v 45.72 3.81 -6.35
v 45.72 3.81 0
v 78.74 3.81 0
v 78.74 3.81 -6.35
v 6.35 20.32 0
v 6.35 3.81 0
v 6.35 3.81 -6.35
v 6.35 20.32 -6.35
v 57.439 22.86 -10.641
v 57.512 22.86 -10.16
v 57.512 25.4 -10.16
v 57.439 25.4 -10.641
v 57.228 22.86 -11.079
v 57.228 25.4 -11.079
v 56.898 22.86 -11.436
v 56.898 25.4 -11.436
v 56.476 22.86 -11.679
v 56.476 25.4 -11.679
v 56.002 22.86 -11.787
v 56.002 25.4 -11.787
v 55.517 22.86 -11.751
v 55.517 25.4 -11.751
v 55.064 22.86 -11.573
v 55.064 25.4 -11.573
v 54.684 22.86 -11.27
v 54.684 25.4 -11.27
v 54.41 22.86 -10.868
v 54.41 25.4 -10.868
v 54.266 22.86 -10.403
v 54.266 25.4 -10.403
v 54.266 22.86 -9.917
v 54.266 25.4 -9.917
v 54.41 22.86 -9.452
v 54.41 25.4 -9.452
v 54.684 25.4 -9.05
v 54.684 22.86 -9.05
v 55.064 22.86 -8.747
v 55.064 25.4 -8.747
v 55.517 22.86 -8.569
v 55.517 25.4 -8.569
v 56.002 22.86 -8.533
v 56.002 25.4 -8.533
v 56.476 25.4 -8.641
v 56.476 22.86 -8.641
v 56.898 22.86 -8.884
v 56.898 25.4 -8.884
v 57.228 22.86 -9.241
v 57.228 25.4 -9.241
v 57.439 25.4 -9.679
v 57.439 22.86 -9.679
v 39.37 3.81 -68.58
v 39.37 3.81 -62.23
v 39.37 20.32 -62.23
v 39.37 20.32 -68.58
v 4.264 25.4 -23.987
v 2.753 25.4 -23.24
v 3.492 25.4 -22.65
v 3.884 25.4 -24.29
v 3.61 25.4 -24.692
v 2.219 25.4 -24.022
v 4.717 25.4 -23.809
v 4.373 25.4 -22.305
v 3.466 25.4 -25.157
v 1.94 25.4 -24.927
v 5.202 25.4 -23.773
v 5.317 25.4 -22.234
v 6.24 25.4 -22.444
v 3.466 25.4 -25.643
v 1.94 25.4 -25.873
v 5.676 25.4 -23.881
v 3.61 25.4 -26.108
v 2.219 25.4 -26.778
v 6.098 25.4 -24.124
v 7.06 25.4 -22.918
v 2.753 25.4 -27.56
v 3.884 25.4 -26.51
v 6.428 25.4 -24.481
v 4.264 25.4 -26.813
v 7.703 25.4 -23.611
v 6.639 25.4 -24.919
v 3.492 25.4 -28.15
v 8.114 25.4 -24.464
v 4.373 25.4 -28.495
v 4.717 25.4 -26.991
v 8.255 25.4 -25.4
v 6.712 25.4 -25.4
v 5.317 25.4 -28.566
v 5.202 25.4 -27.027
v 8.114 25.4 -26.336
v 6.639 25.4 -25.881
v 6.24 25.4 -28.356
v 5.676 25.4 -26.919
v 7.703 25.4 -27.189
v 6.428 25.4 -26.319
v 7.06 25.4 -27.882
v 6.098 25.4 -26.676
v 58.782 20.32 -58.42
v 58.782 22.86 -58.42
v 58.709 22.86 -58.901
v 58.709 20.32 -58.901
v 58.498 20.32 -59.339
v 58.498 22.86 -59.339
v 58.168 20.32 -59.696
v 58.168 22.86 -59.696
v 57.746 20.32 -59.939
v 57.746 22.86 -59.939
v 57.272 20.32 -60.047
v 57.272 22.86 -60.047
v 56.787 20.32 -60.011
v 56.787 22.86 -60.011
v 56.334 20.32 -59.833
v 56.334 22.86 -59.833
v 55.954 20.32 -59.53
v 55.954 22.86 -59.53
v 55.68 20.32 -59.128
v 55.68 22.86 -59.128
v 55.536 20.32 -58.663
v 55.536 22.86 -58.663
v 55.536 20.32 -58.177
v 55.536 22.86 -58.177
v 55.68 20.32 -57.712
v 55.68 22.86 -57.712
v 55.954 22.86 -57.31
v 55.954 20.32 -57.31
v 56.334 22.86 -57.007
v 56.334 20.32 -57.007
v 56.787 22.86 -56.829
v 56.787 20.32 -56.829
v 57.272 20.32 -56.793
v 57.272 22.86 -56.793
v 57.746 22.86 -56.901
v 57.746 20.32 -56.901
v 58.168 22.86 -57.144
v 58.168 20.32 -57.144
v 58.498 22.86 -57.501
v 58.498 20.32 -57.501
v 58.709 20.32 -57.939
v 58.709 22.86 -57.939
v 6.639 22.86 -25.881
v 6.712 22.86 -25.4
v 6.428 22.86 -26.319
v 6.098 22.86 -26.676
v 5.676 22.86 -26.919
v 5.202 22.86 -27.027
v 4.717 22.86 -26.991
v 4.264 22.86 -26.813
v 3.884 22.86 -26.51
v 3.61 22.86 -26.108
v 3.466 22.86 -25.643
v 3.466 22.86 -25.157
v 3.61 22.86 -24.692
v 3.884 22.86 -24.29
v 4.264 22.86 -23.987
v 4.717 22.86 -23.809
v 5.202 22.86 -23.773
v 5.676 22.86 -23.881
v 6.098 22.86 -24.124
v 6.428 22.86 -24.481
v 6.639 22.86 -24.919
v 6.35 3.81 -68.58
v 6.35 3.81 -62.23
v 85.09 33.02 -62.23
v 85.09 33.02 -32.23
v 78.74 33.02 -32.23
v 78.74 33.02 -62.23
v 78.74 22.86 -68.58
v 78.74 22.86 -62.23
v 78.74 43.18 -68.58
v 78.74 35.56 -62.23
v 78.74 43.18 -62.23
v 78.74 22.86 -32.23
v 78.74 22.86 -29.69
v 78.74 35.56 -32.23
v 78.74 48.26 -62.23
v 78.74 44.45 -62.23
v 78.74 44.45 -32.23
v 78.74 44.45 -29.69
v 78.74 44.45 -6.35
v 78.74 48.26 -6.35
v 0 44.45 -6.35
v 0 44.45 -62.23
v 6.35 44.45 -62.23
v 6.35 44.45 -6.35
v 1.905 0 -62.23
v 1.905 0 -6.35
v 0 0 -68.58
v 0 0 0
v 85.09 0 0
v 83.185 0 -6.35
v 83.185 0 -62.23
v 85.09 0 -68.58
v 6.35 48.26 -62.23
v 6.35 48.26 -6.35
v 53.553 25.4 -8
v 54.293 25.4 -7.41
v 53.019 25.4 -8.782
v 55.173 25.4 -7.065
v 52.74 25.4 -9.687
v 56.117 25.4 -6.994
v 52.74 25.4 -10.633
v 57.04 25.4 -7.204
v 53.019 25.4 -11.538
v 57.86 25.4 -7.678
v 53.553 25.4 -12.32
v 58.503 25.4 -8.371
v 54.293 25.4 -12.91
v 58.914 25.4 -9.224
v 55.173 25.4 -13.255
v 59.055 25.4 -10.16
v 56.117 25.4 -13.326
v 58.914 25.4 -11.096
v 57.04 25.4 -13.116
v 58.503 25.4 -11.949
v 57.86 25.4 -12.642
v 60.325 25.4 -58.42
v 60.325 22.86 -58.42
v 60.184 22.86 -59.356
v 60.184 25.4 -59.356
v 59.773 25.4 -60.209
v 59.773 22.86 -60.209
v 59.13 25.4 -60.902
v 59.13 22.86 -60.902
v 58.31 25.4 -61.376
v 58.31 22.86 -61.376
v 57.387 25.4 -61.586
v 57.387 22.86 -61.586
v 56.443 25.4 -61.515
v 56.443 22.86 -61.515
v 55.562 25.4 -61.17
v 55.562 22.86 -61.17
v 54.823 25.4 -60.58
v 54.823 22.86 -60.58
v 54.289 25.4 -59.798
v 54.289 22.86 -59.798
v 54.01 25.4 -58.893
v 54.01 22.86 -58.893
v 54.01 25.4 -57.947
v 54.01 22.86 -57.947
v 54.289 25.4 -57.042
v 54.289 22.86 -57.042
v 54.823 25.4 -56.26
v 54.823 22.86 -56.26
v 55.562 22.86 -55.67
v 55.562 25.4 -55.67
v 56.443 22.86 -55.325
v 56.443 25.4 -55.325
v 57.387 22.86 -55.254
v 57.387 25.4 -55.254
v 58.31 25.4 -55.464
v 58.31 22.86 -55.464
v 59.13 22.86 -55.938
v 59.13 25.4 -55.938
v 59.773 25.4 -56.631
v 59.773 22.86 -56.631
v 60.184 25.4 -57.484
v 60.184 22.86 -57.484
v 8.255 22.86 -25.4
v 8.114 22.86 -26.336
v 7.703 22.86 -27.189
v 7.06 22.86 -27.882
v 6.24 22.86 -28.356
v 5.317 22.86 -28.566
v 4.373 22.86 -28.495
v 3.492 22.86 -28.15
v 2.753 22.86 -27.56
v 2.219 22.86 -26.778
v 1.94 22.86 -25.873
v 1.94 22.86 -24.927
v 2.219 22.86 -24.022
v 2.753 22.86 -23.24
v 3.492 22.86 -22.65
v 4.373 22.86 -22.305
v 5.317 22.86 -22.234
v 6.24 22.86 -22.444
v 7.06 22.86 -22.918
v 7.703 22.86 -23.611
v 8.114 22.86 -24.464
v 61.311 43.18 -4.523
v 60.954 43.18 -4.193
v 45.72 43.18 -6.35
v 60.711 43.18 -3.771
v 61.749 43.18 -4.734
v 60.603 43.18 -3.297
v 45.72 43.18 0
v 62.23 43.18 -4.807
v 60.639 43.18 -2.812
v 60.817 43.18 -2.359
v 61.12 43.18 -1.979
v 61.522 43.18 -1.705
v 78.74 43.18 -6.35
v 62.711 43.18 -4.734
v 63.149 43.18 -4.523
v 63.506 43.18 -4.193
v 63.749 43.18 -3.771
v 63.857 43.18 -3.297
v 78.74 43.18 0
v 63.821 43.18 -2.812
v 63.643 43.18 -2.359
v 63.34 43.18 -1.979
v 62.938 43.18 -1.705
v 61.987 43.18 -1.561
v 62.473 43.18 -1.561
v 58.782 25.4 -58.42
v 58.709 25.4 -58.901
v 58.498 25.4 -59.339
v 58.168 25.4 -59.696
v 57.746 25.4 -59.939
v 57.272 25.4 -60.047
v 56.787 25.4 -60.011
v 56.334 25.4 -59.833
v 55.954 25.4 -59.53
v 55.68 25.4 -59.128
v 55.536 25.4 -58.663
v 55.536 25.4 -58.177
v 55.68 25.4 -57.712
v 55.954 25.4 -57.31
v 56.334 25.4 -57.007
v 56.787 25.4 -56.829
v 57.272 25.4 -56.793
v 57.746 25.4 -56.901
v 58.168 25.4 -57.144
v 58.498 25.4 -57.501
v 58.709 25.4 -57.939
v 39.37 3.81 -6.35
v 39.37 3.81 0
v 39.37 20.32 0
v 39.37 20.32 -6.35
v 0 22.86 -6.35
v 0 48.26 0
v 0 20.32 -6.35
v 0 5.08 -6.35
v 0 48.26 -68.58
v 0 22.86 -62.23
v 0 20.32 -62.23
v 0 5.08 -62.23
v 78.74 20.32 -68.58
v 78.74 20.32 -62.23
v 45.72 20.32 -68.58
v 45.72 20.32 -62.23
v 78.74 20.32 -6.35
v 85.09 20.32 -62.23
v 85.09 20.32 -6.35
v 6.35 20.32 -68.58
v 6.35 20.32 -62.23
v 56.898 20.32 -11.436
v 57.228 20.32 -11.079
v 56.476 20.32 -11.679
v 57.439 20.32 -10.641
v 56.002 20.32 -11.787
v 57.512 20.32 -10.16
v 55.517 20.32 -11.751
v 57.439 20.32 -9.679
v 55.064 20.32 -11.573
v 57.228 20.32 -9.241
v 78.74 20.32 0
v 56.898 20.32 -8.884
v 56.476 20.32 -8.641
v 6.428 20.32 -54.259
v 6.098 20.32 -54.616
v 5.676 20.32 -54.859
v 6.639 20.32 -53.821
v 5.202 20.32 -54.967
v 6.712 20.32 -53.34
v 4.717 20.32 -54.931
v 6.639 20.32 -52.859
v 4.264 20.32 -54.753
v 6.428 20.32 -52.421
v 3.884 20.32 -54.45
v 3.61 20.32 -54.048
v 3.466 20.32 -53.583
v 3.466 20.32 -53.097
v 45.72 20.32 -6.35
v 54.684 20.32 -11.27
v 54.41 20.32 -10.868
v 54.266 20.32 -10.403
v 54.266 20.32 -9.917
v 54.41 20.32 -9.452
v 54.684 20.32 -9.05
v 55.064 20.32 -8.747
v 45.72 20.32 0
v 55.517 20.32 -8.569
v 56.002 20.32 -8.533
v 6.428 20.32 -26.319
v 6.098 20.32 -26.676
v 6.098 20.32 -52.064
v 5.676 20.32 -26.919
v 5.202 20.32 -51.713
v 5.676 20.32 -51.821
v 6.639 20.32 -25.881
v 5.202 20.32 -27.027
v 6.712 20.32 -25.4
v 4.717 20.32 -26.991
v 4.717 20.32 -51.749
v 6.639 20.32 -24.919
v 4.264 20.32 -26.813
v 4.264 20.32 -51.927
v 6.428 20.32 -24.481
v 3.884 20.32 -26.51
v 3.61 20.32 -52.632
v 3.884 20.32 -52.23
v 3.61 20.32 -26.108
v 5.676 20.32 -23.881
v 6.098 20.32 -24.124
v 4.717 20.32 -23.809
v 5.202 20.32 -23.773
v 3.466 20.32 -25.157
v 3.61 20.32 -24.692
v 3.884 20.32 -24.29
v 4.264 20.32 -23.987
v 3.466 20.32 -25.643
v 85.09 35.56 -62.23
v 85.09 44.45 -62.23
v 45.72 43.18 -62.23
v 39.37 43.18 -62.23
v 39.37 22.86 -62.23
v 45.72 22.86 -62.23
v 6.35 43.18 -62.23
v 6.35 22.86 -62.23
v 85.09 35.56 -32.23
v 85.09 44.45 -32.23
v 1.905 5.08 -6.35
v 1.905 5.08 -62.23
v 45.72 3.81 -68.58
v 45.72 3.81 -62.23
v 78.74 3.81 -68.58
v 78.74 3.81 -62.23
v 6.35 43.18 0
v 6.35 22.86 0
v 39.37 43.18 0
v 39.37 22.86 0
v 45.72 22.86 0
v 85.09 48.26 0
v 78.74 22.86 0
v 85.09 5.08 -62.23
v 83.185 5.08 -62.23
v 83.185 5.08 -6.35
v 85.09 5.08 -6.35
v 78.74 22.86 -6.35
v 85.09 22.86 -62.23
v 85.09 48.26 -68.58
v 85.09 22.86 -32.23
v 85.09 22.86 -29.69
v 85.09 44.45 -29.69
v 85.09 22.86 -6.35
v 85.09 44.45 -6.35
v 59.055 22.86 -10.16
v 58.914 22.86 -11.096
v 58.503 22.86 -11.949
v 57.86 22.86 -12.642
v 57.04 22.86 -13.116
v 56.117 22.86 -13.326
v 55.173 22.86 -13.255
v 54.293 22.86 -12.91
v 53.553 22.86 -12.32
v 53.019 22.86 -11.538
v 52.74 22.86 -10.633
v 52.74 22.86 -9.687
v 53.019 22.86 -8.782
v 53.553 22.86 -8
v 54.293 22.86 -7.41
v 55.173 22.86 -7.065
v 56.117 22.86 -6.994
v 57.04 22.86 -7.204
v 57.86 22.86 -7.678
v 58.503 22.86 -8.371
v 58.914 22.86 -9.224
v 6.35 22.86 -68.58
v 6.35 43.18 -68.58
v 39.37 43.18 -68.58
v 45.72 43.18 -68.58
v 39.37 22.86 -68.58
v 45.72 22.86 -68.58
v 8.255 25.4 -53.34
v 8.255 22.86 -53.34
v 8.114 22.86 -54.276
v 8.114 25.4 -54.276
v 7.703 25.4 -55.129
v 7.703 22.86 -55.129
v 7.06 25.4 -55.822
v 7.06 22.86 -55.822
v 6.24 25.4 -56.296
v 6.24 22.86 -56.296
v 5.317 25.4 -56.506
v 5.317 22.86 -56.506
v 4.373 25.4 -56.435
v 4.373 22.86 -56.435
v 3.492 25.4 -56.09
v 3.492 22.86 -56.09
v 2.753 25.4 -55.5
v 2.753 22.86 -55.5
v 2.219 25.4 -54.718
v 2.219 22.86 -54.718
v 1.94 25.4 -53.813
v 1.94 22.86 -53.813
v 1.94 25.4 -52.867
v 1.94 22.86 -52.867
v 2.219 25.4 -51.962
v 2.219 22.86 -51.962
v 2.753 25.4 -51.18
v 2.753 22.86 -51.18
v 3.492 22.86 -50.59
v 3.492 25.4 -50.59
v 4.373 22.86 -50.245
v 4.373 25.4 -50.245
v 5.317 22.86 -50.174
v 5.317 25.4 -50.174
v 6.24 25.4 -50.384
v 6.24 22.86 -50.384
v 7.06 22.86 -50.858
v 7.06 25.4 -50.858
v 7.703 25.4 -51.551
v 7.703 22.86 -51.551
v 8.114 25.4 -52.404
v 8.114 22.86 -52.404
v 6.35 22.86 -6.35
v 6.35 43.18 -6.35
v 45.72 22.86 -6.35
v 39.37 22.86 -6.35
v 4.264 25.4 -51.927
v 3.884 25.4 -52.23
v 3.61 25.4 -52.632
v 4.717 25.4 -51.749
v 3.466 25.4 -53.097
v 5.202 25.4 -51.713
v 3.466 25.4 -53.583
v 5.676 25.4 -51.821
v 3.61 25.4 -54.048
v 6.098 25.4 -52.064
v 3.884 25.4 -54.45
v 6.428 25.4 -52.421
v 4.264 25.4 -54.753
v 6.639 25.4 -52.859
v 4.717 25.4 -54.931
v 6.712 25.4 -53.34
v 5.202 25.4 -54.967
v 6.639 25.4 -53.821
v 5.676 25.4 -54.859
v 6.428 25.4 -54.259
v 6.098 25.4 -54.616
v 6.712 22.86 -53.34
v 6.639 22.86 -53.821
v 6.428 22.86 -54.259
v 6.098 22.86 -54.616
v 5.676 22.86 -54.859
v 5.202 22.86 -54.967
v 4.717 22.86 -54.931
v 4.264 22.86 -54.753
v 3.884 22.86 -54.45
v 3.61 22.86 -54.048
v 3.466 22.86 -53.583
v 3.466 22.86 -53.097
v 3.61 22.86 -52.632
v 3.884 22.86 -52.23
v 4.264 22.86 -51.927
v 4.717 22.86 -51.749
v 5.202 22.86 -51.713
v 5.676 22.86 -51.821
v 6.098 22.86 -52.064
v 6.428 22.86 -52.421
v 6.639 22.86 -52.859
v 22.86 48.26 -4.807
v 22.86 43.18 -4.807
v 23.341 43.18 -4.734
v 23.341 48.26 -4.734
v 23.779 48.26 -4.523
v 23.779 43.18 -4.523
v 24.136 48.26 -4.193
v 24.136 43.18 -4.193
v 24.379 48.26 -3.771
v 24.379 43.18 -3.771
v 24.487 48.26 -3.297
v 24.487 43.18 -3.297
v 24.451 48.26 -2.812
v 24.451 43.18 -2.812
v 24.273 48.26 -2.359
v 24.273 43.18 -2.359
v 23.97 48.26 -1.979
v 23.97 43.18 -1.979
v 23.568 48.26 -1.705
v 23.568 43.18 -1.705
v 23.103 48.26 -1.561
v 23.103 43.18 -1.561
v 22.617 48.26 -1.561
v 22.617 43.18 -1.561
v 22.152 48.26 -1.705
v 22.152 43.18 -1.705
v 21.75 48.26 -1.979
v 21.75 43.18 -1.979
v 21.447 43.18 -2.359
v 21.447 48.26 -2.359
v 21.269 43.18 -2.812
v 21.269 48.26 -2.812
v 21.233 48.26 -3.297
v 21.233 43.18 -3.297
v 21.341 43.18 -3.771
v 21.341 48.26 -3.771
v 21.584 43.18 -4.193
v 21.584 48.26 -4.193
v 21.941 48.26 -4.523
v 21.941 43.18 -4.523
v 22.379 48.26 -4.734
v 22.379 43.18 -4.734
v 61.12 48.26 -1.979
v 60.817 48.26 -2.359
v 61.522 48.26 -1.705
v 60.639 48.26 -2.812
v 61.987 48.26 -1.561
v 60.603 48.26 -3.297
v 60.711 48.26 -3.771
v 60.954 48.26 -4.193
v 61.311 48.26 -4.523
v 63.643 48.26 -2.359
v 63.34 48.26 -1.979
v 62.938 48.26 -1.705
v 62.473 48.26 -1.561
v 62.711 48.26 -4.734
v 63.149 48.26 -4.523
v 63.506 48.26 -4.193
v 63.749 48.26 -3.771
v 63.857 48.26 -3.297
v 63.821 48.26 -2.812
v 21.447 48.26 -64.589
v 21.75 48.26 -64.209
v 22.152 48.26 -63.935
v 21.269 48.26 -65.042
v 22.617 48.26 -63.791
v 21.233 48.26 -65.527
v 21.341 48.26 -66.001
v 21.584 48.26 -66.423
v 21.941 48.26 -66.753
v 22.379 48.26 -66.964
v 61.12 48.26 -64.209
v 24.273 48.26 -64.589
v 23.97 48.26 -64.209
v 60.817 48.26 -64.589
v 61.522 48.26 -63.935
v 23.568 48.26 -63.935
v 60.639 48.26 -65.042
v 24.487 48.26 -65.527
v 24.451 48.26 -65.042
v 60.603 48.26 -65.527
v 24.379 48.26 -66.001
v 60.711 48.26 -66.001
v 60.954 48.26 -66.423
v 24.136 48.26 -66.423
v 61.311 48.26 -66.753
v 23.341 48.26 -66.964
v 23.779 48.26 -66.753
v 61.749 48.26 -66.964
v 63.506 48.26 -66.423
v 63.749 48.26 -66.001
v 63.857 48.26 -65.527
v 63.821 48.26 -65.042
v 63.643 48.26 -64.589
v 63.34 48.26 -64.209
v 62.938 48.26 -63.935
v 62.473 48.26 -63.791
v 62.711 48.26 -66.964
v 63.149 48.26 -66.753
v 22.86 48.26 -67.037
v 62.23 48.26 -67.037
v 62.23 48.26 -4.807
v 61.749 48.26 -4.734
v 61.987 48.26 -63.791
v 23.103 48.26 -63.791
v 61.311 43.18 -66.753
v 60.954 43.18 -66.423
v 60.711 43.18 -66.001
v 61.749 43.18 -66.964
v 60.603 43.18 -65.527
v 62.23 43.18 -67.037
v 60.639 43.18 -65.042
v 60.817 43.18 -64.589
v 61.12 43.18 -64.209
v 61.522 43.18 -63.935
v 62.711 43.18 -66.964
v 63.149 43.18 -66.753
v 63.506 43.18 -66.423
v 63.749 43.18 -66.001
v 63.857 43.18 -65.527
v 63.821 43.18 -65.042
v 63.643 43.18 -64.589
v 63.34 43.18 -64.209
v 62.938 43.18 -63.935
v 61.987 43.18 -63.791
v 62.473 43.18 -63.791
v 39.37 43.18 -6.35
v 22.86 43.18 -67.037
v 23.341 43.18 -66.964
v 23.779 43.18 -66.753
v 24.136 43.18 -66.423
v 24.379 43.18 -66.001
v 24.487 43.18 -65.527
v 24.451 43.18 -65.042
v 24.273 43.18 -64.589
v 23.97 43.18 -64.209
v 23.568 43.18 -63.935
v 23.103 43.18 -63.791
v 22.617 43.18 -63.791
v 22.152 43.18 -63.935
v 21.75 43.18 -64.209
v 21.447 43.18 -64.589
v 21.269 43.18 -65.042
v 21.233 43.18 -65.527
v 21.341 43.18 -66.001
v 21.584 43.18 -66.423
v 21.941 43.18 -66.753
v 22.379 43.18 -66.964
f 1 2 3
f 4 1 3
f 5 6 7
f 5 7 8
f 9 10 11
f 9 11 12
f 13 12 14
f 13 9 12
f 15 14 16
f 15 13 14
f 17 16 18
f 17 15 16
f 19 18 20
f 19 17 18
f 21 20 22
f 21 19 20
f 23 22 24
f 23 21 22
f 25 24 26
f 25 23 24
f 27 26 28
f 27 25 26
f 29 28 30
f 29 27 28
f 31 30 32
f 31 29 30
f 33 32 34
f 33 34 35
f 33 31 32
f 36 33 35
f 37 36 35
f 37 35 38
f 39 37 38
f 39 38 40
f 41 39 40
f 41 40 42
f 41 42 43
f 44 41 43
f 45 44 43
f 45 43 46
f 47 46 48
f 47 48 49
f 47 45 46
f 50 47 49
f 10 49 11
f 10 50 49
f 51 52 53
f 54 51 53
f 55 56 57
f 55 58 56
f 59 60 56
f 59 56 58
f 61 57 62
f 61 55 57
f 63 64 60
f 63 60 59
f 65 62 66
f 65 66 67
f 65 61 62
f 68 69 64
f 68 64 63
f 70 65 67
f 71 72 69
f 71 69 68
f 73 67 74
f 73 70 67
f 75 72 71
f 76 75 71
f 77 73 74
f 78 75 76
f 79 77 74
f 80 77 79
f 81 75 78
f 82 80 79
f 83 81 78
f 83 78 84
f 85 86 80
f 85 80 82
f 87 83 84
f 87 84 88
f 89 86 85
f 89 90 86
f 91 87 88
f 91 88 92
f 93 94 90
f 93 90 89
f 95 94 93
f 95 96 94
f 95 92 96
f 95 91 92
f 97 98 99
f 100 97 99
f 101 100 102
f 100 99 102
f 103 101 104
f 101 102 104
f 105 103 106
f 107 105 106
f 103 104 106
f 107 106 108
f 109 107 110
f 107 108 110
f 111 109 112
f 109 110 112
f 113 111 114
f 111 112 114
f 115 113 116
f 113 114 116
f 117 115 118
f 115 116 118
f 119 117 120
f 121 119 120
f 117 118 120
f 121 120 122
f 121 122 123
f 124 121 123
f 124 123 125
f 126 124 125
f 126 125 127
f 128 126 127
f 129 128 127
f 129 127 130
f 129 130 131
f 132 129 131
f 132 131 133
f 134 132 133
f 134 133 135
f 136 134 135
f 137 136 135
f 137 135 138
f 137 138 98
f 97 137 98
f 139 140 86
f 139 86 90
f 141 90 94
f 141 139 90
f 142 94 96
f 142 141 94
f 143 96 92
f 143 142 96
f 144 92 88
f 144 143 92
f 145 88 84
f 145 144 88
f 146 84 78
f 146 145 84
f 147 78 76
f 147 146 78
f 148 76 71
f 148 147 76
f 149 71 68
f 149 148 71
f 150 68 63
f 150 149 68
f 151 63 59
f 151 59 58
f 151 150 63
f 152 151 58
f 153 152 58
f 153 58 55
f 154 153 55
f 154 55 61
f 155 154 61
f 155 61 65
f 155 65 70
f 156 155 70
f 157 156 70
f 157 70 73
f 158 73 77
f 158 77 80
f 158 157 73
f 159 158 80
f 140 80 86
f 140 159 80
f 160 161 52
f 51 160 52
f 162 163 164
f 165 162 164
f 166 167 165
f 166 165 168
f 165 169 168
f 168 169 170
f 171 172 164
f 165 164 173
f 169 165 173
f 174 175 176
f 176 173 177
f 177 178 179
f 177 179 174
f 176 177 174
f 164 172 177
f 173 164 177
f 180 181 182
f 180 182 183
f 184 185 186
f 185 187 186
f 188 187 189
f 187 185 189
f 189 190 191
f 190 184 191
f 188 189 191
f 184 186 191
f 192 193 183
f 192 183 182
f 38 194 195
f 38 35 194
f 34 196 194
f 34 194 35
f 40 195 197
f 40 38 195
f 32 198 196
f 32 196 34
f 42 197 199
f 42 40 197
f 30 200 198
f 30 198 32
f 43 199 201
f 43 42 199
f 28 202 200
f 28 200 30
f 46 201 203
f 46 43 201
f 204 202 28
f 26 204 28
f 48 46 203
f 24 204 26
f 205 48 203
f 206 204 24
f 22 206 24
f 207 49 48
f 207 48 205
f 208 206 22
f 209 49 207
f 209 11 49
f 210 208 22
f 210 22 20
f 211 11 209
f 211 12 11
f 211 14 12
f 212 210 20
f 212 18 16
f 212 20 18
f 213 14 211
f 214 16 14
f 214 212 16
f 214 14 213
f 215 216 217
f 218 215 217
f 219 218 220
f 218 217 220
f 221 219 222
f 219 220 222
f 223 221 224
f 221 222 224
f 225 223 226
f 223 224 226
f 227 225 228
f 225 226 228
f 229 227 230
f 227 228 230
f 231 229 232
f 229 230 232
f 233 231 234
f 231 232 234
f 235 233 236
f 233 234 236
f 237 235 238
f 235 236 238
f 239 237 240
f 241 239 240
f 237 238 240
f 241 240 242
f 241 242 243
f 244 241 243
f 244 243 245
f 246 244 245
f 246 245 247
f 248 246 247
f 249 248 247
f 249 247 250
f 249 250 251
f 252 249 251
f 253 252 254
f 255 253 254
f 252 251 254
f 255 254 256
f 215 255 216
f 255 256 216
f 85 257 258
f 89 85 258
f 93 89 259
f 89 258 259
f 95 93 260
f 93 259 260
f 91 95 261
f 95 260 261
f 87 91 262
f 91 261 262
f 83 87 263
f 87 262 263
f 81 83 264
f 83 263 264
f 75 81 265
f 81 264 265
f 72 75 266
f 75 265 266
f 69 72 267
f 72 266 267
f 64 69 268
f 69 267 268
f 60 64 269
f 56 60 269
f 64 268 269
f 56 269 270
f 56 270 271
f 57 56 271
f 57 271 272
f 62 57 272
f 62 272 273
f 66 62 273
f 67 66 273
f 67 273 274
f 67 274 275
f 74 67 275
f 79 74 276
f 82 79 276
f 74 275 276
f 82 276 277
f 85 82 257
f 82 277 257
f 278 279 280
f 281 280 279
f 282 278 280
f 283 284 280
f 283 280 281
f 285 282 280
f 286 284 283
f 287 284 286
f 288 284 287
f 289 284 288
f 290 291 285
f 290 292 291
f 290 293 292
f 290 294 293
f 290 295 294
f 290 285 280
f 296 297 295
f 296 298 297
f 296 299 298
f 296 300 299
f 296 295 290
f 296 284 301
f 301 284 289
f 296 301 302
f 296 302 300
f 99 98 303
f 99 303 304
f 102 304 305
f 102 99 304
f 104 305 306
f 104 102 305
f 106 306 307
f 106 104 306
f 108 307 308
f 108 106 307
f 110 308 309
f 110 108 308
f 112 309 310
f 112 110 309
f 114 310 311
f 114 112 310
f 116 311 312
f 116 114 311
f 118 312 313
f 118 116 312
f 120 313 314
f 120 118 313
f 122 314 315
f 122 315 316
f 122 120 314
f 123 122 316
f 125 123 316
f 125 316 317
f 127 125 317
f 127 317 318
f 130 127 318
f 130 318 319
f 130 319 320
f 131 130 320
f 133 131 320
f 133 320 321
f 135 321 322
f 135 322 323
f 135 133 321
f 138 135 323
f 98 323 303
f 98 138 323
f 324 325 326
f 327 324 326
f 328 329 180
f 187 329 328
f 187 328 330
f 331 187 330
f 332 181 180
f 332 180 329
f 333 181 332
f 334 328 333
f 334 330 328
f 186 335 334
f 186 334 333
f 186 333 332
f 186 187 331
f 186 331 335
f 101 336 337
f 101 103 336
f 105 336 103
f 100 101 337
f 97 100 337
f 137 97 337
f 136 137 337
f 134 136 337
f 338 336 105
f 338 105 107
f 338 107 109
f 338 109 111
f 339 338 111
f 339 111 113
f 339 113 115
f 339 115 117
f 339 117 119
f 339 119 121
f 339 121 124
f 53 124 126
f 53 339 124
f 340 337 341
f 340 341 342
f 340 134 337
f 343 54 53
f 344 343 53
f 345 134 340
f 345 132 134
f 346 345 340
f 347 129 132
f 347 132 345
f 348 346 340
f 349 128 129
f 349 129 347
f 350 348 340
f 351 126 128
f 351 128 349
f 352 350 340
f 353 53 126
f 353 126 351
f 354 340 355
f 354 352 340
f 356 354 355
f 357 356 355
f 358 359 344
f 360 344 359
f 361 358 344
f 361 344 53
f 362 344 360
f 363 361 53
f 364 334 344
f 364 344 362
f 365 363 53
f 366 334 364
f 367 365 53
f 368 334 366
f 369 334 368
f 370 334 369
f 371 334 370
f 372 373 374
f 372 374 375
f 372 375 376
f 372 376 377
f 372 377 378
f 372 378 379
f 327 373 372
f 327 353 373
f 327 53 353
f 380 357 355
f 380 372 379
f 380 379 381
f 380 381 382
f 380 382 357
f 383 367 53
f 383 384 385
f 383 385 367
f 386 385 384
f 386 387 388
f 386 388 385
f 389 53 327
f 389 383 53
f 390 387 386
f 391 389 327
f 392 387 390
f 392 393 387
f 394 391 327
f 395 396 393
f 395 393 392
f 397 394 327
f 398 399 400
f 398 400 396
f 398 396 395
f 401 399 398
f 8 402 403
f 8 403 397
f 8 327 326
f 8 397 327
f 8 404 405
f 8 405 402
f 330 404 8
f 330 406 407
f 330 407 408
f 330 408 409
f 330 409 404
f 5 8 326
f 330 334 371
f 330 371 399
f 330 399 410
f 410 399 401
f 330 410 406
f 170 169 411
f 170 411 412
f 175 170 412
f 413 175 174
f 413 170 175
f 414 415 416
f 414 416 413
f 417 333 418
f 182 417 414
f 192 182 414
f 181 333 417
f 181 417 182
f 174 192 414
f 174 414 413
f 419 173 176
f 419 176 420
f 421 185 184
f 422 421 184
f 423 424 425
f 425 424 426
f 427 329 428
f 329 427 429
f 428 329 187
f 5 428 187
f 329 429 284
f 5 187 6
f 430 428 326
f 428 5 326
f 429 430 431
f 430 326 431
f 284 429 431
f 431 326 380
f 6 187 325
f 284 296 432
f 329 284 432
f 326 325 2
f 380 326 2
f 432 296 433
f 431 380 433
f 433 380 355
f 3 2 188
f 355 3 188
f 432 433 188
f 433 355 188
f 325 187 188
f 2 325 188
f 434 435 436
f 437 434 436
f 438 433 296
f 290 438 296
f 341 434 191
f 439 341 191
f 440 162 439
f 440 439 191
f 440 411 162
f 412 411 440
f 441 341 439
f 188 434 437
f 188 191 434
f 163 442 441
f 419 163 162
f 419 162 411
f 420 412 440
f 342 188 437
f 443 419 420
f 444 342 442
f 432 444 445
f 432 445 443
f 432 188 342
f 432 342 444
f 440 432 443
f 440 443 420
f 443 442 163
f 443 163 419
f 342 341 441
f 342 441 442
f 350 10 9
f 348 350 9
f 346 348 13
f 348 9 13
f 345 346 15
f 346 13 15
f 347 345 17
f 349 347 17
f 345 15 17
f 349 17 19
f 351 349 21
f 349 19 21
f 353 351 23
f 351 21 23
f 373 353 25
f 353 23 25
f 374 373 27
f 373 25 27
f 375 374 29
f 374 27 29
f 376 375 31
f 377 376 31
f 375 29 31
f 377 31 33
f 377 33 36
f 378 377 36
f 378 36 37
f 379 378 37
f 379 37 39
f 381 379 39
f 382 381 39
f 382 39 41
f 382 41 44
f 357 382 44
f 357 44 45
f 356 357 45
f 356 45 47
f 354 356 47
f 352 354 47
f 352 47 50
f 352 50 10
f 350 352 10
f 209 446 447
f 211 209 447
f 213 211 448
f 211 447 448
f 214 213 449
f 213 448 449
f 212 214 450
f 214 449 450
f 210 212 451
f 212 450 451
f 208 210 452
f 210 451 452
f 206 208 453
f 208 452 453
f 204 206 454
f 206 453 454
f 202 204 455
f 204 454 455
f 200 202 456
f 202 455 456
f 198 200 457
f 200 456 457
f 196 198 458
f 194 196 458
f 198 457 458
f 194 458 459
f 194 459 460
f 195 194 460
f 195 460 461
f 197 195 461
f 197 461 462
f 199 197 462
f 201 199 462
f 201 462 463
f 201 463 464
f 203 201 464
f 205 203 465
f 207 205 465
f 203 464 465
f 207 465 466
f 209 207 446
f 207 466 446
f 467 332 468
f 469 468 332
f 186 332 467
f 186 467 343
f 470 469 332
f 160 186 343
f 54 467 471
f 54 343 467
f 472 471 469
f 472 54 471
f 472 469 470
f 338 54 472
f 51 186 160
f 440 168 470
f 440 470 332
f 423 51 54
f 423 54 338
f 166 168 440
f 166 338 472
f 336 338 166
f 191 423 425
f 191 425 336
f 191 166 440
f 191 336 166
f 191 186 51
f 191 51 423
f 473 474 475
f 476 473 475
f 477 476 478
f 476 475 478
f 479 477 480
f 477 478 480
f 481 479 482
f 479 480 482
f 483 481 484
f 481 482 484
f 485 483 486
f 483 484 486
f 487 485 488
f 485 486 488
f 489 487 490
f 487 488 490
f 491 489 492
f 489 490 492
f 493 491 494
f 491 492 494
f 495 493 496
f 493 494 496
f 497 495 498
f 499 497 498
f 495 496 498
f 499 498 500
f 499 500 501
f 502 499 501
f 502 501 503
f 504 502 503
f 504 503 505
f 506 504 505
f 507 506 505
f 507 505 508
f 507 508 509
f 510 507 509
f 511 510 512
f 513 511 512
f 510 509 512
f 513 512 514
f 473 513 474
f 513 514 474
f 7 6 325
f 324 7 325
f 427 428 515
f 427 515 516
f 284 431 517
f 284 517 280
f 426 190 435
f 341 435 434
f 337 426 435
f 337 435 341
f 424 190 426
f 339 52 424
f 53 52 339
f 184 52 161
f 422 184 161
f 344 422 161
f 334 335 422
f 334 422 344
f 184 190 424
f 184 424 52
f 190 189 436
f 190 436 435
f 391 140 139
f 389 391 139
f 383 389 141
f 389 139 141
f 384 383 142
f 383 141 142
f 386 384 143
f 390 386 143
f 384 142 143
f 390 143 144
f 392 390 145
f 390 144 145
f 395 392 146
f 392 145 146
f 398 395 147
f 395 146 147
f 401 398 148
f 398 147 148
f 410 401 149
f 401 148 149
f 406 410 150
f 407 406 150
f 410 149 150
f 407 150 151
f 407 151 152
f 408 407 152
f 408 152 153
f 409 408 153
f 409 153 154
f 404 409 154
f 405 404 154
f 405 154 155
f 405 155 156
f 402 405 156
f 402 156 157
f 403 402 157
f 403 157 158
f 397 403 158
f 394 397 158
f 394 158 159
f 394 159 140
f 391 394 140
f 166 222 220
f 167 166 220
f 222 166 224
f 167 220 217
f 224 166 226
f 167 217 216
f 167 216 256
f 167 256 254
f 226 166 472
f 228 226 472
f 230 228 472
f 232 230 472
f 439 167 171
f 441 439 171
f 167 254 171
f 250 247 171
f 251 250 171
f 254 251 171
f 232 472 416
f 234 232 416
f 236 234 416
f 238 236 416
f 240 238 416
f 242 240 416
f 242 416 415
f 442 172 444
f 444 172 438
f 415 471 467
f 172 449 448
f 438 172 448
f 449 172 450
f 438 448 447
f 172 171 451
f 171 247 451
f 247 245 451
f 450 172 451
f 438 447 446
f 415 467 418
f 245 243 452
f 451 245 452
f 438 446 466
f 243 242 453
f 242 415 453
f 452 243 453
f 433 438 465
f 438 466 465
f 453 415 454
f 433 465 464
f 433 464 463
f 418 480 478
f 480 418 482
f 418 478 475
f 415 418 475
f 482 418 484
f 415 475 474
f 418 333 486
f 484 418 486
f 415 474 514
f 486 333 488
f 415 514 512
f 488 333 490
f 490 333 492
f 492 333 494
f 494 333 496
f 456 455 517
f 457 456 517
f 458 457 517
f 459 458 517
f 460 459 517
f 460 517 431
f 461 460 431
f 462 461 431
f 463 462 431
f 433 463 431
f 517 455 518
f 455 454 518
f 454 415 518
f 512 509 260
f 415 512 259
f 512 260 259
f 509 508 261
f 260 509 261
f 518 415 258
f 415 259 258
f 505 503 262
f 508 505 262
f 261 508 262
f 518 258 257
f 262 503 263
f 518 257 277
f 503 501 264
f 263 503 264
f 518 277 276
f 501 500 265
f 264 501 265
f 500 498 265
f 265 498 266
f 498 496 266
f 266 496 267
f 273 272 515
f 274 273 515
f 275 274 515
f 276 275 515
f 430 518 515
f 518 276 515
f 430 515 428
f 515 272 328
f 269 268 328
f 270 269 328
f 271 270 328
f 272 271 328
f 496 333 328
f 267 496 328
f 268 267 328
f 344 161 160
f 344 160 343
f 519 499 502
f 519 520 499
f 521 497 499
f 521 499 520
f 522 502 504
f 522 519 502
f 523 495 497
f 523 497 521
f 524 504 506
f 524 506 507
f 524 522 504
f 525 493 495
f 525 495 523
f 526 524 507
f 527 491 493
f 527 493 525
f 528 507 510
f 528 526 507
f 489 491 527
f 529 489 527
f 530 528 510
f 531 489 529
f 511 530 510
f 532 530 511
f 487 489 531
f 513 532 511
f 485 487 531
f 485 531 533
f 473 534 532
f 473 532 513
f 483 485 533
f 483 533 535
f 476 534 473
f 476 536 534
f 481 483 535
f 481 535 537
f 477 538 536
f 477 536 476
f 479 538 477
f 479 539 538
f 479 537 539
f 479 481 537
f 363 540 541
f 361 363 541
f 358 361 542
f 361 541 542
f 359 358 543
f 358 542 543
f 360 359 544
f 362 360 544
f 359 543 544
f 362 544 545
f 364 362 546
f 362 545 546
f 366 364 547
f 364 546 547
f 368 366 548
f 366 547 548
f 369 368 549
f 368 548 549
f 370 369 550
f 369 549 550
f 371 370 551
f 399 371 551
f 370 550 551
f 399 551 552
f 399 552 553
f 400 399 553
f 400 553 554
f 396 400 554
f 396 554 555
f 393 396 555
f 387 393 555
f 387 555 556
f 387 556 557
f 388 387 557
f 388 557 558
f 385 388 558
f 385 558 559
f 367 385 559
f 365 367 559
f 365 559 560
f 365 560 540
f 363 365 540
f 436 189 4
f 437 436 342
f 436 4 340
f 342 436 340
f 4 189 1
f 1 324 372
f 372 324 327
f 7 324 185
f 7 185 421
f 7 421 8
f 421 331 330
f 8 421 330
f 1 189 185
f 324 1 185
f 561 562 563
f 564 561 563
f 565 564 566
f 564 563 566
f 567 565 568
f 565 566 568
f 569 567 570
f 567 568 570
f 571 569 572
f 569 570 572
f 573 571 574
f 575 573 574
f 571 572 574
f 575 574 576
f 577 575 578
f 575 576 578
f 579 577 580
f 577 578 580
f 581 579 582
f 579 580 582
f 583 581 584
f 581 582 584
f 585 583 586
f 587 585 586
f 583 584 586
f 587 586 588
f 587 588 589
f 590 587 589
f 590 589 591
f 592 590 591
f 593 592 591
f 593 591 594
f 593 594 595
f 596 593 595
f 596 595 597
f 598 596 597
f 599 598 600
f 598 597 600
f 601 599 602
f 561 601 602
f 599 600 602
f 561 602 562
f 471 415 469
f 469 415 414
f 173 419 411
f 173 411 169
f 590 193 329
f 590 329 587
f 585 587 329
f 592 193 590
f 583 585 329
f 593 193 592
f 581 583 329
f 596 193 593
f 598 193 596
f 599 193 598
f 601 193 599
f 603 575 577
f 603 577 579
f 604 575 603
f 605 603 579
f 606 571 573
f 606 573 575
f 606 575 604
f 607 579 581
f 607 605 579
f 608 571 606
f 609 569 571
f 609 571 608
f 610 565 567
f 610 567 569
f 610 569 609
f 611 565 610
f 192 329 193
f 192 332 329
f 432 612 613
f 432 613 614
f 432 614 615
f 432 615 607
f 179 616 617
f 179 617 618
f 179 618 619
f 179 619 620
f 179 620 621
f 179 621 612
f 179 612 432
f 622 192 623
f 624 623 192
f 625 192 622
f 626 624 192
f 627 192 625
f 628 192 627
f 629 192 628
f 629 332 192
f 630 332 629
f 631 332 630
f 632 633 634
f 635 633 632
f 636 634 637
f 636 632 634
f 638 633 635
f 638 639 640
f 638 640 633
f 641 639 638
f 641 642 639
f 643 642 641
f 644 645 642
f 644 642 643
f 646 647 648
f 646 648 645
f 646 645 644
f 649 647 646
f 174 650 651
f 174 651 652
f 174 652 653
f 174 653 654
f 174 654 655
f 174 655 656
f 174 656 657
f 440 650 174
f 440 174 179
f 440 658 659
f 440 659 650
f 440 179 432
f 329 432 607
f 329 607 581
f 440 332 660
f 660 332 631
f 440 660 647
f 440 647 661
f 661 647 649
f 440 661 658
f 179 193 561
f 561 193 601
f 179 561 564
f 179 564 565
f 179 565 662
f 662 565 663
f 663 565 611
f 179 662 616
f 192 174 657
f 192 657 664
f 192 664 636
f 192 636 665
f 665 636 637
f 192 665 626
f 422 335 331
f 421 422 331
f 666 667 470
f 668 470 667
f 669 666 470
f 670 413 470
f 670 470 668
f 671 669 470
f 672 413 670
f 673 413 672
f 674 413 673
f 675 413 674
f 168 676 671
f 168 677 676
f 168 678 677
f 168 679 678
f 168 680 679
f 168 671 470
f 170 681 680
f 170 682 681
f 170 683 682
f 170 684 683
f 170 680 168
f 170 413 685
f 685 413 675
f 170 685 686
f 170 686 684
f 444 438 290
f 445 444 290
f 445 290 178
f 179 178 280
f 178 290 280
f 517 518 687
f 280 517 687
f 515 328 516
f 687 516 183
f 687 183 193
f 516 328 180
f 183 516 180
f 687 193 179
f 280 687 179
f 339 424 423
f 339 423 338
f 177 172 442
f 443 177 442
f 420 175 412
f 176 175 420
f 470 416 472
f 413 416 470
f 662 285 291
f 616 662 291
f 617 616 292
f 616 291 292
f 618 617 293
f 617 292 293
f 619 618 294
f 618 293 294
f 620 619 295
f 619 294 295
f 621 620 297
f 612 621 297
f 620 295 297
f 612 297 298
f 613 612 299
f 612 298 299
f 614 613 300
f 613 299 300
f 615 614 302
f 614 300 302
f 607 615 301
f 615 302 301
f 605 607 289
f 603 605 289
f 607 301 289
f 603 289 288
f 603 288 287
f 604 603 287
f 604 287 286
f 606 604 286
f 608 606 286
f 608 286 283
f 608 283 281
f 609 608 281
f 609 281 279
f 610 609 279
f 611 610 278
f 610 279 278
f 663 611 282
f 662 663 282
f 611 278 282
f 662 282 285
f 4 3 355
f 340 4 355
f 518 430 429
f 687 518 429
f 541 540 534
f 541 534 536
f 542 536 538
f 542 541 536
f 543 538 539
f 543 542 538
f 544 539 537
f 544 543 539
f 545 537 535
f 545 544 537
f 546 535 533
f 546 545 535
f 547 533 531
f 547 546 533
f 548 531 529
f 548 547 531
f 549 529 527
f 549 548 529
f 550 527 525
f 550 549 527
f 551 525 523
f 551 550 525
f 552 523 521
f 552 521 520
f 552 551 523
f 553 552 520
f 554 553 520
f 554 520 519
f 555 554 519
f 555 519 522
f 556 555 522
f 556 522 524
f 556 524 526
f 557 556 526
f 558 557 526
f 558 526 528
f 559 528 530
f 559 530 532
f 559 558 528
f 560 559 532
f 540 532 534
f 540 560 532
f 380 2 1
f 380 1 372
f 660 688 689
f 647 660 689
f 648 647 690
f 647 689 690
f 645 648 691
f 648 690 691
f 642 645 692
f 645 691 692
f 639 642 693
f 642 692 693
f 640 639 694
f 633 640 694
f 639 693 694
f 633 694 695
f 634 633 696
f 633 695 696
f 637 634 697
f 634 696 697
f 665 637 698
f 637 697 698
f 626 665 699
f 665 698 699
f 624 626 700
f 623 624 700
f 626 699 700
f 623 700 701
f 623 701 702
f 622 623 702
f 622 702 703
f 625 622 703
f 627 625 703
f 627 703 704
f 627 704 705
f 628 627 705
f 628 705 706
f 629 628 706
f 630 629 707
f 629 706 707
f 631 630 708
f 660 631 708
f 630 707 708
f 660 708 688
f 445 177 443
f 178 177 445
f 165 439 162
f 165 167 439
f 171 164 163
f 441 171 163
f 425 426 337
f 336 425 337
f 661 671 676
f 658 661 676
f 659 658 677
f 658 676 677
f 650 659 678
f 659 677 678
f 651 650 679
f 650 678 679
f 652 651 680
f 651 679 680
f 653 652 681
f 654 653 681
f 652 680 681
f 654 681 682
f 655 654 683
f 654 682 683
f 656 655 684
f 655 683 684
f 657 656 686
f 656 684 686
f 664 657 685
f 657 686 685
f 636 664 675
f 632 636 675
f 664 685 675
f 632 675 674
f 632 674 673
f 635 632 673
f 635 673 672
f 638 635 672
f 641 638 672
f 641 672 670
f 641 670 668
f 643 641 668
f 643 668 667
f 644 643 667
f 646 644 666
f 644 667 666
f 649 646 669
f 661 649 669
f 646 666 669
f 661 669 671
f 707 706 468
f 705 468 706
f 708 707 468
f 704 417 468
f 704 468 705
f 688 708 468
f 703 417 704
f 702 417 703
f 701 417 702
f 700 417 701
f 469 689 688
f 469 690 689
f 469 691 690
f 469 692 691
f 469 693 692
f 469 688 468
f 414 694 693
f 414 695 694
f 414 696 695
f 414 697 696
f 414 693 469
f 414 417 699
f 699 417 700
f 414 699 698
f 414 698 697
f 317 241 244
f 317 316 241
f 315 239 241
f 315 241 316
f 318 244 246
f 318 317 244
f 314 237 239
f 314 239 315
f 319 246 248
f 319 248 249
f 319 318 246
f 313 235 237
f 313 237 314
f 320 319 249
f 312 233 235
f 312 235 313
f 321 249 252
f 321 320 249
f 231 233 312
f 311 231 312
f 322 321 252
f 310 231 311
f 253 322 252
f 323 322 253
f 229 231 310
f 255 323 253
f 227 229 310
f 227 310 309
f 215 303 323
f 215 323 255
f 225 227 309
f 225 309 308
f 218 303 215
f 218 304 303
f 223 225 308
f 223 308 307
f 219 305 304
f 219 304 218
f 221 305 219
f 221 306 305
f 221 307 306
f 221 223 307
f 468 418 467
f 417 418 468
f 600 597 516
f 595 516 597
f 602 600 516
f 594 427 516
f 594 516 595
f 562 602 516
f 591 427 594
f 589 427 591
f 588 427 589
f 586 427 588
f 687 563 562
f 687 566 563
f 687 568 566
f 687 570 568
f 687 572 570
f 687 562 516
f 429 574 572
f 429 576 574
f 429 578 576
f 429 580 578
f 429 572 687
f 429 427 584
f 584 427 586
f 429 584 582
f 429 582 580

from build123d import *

# Parameters (mm, degrees)
SKETCH1_W                        = 85.09
SKETCH1_H                        = 68.58
BOSS_EXTRUDE1_DEPTH              = 48.26
SKETCH2_W                        = 72.39
SKETCH2_H                        = 55.88
CUT_EXTRUDE1_DEPTH               = 25.4
SKETCH4_W                        = 55.88
SKETCH4_H                        = 21.59
SKETCH4_H_2                      = 15.24
CUT_EXTRUDE2_DEPTH               = 86.09
SKETCH5_W                        = 81.28
SKETCH5_H                        = 55.88
CUT_EXTRUDE4_DEPTH               = 20.32
F_30_0_1285_DIAMETER_HOLE1_D     = 3.2639
F_30_0_1285_DIAMETER_HOLE1_DEPTH = 12.7
F_30_0_1285_DIAMETER_HOLE1_TIP   = 0.980574487
SKETCH9_W                        = 33.02
SKETCH9_H                        = 16.51
SKETCH9_H_2                      = 20.32
CUT_EXTRUDE5_DEPTH               = 69.58
SKETCH10_R                       = 3.175
SKETCH10_R_2                     = 1.63195
BOSS_EXTRUDE2_DEPTH              = 2.54
CUT_EXTRUDE6_REACH               = 24.86
SKETCH10_3_R                     = 1.63195
SKETCH12_W                       = 6.35
SKETCH12_H                       = 2.54
BOSS_EXTRUDE3_DEPTH              = 22.606
SKETCH13_W                       = 6.35
SKETCH13_H                       = 2.54
BOSS_EXTRUDE4_DEPTH              = 33.782


with BuildPart() as part:
    # Sketch1 → Boss-Extrude1 (new body)
    with BuildSketch(Plane(origin=(0, 0, 0), x_dir=(1, 0, 0), z_dir=(0, 1, 0))):
        with Locations((42.545, 34.29)):
            Rectangle(SKETCH1_W, SKETCH1_H)
    extrude(amount=BOSS_EXTRUDE1_DEPTH)

    # Sketch2 → Cut-Extrude1 (cut)
    with BuildSketch(Plane(origin=(0, 48.26, 0), x_dir=(1, 0, 0), z_dir=(0, 1, 0))):
        with Locations((42.545, 34.29)):
            Rectangle(SKETCH2_W, SKETCH2_H)
    extrude(amount=-CUT_EXTRUDE1_DEPTH, mode=Mode.SUBTRACT)

    # Sketch4 → Cut-Extrude2 (cut, through all)
    with BuildSketch(Plane.ZY):
        with Locations((-34.29, 33.655)):
            Rectangle(SKETCH4_W, SKETCH4_H)
        with Locations((-34.29, 12.7)):
            Rectangle(SKETCH4_W, SKETCH4_H_2)
    extrude(amount=-CUT_EXTRUDE2_DEPTH, mode=Mode.SUBTRACT)

    # Sketch5 → Cut-Extrude4 (cut)
    with BuildSketch(Plane(origin=(0, 0, 0), x_dir=(-1, 0, 0), z_dir=(0, -1, 0))):
        with Locations((-42.545, 34.29)):
            Rectangle(SKETCH5_W, SKETCH5_H)
    extrude(amount=-CUT_EXTRUDE4_DEPTH, mode=Mode.SUBTRACT)

    # 30 _0.1285_ Diameter Hole1
    with Locations(Plane(origin=(22.86, 48.26, -3.175), x_dir=(0, 0, 1), z_dir=(0, 1, 0))):
        with Locations((0, 0), (-62.23, 0), (-62.23, 39.37), (0, 39.37)):
            Hole(F_30_0_1285_DIAMETER_HOLE1_D / 2, depth=F_30_0_1285_DIAMETER_HOLE1_DEPTH)
            with Locations((0, 0, -(F_30_0_1285_DIAMETER_HOLE1_DEPTH + F_30_0_1285_DIAMETER_HOLE1_TIP / 2))):  # 118° drill point
                Cone(0, F_30_0_1285_DIAMETER_HOLE1_D / 2, F_30_0_1285_DIAMETER_HOLE1_TIP, mode=Mode.SUBTRACT)

    # Sketch9 → Cut-Extrude5 (cut, through all)
    with BuildSketch(Plane.XY):
        with Locations((22.86, 12.065)):
            Rectangle(SKETCH9_W, SKETCH9_H)
        with Locations((22.86, 33.02)):
            Rectangle(SKETCH9_W, SKETCH9_H_2)
        with Locations((62.23, 33.02)):
            Rectangle(SKETCH9_W, SKETCH9_H_2)
        with Locations((62.23, 12.065)):
            Rectangle(SKETCH9_W, SKETCH9_H)
    extrude(amount=-CUT_EXTRUDE5_DEPTH, mode=Mode.SUBTRACT)

    # Sketch10 → Boss-Extrude2 (add)
    with BuildSketch(Plane(origin=(0, 22.86, 0), x_dir=(1, 0, 0), z_dir=(0, 1, 0))):
        with Locations((57.15, 58.42)):
            Circle(SKETCH10_R)
        with Locations((57.15, 58.42)):
            Circle(SKETCH10_R_2, mode=Mode.SUBTRACT)
        with Locations((55.88, 10.16)):
            Circle(SKETCH10_R)
        with Locations((55.88, 10.16)):
            Circle(SKETCH10_R_2, mode=Mode.SUBTRACT)
        with Locations((5.08, 25.4)):
            Circle(SKETCH10_R)
        with Locations((5.08, 25.4)):
            Circle(SKETCH10_R_2, mode=Mode.SUBTRACT)
        with Locations((5.08, 53.34)):
            Circle(SKETCH10_R)
        with Locations((5.08, 53.34)):
            Circle(SKETCH10_R_2, mode=Mode.SUBTRACT)
    extrude(amount=BOSS_EXTRUDE2_DEPTH)

    # Sketch10_3 → Cut-Extrude6 (cut, up to next)
    with BuildSketch(Plane(origin=(0, 22.86, 0), x_dir=(1, 0, 0), z_dir=(0, 1, 0)), mode=Mode.PRIVATE) as cut_extrude6_sk1:
        with Locations((57.15, 58.42)):
            Circle(SKETCH10_3_R)
    cut_extrude6_tool1 = extrude(cut_extrude6_sk1.sketch, amount=-CUT_EXTRUDE6_REACH, mode=Mode.PRIVATE) & part.part
    add(cut_extrude6_tool1.solids().sort_by_distance((57.15, 22.86, -58.42))[0], mode=Mode.SUBTRACT)
    # Sketch10_3 → Cut-Extrude6 (cut, up to next)
    with BuildSketch(Plane(origin=(0, 22.86, 0), x_dir=(1, 0, 0), z_dir=(0, 1, 0)), mode=Mode.PRIVATE) as cut_extrude6_sk2:
        with Locations((55.88, 10.16)):
            Circle(SKETCH10_3_R)
    cut_extrude6_tool2 = extrude(cut_extrude6_sk2.sketch, amount=-CUT_EXTRUDE6_REACH, mode=Mode.PRIVATE) & part.part
    add(cut_extrude6_tool2.solids().sort_by_distance((55.88, 22.86, -10.16))[0], mode=Mode.SUBTRACT)
    # Sketch10_3 → Cut-Extrude6 (cut, up to next)
    with BuildSketch(Plane(origin=(0, 22.86, 0), x_dir=(1, 0, 0), z_dir=(0, 1, 0)), mode=Mode.PRIVATE) as cut_extrude6_sk3:
        with Locations((5.08, 25.4)):
            Circle(SKETCH10_3_R)
    cut_extrude6_tool3 = extrude(cut_extrude6_sk3.sketch, amount=-CUT_EXTRUDE6_REACH, mode=Mode.PRIVATE) & part.part
    add(cut_extrude6_tool3.solids().sort_by_distance((5.08, 22.86, -25.4))[0], mode=Mode.SUBTRACT)
    # Sketch10_3 → Cut-Extrude6 (cut, up to next)
    with BuildSketch(Plane(origin=(0, 22.86, 0), x_dir=(1, 0, 0), z_dir=(0, 1, 0)), mode=Mode.PRIVATE) as cut_extrude6_sk4:
        with Locations((5.08, 53.34)):
            Circle(SKETCH10_3_R)
    cut_extrude6_tool4 = extrude(cut_extrude6_sk4.sketch, amount=-CUT_EXTRUDE6_REACH, mode=Mode.PRIVATE) & part.part
    add(cut_extrude6_tool4.solids().sort_by_distance((5.08, 22.86, -53.34))[0], mode=Mode.SUBTRACT)

    # Sketch12 → Boss-Extrude3 (add)
    with BuildSketch(Plane(origin=(0, 22.86, 0), x_dir=(1, 0, 0), z_dir=(0, 1, 0))):
        with Locations((81.915, 30.96)):
            Rectangle(SKETCH12_W, SKETCH12_H)
    extrude(amount=BOSS_EXTRUDE3_DEPTH)

    # Sketch13 → Boss-Extrude4 (add)
    with BuildSketch(Plane(origin=(0, 0, -32.23), x_dir=(-1, 0, 0), z_dir=(0, 0, -1))):
        with Locations((-81.915, 34.29)):
            Rectangle(SKETCH13_W, SKETCH13_H)
    extrude(amount=BOSS_EXTRUDE4_DEPTH)


solid = part.part
